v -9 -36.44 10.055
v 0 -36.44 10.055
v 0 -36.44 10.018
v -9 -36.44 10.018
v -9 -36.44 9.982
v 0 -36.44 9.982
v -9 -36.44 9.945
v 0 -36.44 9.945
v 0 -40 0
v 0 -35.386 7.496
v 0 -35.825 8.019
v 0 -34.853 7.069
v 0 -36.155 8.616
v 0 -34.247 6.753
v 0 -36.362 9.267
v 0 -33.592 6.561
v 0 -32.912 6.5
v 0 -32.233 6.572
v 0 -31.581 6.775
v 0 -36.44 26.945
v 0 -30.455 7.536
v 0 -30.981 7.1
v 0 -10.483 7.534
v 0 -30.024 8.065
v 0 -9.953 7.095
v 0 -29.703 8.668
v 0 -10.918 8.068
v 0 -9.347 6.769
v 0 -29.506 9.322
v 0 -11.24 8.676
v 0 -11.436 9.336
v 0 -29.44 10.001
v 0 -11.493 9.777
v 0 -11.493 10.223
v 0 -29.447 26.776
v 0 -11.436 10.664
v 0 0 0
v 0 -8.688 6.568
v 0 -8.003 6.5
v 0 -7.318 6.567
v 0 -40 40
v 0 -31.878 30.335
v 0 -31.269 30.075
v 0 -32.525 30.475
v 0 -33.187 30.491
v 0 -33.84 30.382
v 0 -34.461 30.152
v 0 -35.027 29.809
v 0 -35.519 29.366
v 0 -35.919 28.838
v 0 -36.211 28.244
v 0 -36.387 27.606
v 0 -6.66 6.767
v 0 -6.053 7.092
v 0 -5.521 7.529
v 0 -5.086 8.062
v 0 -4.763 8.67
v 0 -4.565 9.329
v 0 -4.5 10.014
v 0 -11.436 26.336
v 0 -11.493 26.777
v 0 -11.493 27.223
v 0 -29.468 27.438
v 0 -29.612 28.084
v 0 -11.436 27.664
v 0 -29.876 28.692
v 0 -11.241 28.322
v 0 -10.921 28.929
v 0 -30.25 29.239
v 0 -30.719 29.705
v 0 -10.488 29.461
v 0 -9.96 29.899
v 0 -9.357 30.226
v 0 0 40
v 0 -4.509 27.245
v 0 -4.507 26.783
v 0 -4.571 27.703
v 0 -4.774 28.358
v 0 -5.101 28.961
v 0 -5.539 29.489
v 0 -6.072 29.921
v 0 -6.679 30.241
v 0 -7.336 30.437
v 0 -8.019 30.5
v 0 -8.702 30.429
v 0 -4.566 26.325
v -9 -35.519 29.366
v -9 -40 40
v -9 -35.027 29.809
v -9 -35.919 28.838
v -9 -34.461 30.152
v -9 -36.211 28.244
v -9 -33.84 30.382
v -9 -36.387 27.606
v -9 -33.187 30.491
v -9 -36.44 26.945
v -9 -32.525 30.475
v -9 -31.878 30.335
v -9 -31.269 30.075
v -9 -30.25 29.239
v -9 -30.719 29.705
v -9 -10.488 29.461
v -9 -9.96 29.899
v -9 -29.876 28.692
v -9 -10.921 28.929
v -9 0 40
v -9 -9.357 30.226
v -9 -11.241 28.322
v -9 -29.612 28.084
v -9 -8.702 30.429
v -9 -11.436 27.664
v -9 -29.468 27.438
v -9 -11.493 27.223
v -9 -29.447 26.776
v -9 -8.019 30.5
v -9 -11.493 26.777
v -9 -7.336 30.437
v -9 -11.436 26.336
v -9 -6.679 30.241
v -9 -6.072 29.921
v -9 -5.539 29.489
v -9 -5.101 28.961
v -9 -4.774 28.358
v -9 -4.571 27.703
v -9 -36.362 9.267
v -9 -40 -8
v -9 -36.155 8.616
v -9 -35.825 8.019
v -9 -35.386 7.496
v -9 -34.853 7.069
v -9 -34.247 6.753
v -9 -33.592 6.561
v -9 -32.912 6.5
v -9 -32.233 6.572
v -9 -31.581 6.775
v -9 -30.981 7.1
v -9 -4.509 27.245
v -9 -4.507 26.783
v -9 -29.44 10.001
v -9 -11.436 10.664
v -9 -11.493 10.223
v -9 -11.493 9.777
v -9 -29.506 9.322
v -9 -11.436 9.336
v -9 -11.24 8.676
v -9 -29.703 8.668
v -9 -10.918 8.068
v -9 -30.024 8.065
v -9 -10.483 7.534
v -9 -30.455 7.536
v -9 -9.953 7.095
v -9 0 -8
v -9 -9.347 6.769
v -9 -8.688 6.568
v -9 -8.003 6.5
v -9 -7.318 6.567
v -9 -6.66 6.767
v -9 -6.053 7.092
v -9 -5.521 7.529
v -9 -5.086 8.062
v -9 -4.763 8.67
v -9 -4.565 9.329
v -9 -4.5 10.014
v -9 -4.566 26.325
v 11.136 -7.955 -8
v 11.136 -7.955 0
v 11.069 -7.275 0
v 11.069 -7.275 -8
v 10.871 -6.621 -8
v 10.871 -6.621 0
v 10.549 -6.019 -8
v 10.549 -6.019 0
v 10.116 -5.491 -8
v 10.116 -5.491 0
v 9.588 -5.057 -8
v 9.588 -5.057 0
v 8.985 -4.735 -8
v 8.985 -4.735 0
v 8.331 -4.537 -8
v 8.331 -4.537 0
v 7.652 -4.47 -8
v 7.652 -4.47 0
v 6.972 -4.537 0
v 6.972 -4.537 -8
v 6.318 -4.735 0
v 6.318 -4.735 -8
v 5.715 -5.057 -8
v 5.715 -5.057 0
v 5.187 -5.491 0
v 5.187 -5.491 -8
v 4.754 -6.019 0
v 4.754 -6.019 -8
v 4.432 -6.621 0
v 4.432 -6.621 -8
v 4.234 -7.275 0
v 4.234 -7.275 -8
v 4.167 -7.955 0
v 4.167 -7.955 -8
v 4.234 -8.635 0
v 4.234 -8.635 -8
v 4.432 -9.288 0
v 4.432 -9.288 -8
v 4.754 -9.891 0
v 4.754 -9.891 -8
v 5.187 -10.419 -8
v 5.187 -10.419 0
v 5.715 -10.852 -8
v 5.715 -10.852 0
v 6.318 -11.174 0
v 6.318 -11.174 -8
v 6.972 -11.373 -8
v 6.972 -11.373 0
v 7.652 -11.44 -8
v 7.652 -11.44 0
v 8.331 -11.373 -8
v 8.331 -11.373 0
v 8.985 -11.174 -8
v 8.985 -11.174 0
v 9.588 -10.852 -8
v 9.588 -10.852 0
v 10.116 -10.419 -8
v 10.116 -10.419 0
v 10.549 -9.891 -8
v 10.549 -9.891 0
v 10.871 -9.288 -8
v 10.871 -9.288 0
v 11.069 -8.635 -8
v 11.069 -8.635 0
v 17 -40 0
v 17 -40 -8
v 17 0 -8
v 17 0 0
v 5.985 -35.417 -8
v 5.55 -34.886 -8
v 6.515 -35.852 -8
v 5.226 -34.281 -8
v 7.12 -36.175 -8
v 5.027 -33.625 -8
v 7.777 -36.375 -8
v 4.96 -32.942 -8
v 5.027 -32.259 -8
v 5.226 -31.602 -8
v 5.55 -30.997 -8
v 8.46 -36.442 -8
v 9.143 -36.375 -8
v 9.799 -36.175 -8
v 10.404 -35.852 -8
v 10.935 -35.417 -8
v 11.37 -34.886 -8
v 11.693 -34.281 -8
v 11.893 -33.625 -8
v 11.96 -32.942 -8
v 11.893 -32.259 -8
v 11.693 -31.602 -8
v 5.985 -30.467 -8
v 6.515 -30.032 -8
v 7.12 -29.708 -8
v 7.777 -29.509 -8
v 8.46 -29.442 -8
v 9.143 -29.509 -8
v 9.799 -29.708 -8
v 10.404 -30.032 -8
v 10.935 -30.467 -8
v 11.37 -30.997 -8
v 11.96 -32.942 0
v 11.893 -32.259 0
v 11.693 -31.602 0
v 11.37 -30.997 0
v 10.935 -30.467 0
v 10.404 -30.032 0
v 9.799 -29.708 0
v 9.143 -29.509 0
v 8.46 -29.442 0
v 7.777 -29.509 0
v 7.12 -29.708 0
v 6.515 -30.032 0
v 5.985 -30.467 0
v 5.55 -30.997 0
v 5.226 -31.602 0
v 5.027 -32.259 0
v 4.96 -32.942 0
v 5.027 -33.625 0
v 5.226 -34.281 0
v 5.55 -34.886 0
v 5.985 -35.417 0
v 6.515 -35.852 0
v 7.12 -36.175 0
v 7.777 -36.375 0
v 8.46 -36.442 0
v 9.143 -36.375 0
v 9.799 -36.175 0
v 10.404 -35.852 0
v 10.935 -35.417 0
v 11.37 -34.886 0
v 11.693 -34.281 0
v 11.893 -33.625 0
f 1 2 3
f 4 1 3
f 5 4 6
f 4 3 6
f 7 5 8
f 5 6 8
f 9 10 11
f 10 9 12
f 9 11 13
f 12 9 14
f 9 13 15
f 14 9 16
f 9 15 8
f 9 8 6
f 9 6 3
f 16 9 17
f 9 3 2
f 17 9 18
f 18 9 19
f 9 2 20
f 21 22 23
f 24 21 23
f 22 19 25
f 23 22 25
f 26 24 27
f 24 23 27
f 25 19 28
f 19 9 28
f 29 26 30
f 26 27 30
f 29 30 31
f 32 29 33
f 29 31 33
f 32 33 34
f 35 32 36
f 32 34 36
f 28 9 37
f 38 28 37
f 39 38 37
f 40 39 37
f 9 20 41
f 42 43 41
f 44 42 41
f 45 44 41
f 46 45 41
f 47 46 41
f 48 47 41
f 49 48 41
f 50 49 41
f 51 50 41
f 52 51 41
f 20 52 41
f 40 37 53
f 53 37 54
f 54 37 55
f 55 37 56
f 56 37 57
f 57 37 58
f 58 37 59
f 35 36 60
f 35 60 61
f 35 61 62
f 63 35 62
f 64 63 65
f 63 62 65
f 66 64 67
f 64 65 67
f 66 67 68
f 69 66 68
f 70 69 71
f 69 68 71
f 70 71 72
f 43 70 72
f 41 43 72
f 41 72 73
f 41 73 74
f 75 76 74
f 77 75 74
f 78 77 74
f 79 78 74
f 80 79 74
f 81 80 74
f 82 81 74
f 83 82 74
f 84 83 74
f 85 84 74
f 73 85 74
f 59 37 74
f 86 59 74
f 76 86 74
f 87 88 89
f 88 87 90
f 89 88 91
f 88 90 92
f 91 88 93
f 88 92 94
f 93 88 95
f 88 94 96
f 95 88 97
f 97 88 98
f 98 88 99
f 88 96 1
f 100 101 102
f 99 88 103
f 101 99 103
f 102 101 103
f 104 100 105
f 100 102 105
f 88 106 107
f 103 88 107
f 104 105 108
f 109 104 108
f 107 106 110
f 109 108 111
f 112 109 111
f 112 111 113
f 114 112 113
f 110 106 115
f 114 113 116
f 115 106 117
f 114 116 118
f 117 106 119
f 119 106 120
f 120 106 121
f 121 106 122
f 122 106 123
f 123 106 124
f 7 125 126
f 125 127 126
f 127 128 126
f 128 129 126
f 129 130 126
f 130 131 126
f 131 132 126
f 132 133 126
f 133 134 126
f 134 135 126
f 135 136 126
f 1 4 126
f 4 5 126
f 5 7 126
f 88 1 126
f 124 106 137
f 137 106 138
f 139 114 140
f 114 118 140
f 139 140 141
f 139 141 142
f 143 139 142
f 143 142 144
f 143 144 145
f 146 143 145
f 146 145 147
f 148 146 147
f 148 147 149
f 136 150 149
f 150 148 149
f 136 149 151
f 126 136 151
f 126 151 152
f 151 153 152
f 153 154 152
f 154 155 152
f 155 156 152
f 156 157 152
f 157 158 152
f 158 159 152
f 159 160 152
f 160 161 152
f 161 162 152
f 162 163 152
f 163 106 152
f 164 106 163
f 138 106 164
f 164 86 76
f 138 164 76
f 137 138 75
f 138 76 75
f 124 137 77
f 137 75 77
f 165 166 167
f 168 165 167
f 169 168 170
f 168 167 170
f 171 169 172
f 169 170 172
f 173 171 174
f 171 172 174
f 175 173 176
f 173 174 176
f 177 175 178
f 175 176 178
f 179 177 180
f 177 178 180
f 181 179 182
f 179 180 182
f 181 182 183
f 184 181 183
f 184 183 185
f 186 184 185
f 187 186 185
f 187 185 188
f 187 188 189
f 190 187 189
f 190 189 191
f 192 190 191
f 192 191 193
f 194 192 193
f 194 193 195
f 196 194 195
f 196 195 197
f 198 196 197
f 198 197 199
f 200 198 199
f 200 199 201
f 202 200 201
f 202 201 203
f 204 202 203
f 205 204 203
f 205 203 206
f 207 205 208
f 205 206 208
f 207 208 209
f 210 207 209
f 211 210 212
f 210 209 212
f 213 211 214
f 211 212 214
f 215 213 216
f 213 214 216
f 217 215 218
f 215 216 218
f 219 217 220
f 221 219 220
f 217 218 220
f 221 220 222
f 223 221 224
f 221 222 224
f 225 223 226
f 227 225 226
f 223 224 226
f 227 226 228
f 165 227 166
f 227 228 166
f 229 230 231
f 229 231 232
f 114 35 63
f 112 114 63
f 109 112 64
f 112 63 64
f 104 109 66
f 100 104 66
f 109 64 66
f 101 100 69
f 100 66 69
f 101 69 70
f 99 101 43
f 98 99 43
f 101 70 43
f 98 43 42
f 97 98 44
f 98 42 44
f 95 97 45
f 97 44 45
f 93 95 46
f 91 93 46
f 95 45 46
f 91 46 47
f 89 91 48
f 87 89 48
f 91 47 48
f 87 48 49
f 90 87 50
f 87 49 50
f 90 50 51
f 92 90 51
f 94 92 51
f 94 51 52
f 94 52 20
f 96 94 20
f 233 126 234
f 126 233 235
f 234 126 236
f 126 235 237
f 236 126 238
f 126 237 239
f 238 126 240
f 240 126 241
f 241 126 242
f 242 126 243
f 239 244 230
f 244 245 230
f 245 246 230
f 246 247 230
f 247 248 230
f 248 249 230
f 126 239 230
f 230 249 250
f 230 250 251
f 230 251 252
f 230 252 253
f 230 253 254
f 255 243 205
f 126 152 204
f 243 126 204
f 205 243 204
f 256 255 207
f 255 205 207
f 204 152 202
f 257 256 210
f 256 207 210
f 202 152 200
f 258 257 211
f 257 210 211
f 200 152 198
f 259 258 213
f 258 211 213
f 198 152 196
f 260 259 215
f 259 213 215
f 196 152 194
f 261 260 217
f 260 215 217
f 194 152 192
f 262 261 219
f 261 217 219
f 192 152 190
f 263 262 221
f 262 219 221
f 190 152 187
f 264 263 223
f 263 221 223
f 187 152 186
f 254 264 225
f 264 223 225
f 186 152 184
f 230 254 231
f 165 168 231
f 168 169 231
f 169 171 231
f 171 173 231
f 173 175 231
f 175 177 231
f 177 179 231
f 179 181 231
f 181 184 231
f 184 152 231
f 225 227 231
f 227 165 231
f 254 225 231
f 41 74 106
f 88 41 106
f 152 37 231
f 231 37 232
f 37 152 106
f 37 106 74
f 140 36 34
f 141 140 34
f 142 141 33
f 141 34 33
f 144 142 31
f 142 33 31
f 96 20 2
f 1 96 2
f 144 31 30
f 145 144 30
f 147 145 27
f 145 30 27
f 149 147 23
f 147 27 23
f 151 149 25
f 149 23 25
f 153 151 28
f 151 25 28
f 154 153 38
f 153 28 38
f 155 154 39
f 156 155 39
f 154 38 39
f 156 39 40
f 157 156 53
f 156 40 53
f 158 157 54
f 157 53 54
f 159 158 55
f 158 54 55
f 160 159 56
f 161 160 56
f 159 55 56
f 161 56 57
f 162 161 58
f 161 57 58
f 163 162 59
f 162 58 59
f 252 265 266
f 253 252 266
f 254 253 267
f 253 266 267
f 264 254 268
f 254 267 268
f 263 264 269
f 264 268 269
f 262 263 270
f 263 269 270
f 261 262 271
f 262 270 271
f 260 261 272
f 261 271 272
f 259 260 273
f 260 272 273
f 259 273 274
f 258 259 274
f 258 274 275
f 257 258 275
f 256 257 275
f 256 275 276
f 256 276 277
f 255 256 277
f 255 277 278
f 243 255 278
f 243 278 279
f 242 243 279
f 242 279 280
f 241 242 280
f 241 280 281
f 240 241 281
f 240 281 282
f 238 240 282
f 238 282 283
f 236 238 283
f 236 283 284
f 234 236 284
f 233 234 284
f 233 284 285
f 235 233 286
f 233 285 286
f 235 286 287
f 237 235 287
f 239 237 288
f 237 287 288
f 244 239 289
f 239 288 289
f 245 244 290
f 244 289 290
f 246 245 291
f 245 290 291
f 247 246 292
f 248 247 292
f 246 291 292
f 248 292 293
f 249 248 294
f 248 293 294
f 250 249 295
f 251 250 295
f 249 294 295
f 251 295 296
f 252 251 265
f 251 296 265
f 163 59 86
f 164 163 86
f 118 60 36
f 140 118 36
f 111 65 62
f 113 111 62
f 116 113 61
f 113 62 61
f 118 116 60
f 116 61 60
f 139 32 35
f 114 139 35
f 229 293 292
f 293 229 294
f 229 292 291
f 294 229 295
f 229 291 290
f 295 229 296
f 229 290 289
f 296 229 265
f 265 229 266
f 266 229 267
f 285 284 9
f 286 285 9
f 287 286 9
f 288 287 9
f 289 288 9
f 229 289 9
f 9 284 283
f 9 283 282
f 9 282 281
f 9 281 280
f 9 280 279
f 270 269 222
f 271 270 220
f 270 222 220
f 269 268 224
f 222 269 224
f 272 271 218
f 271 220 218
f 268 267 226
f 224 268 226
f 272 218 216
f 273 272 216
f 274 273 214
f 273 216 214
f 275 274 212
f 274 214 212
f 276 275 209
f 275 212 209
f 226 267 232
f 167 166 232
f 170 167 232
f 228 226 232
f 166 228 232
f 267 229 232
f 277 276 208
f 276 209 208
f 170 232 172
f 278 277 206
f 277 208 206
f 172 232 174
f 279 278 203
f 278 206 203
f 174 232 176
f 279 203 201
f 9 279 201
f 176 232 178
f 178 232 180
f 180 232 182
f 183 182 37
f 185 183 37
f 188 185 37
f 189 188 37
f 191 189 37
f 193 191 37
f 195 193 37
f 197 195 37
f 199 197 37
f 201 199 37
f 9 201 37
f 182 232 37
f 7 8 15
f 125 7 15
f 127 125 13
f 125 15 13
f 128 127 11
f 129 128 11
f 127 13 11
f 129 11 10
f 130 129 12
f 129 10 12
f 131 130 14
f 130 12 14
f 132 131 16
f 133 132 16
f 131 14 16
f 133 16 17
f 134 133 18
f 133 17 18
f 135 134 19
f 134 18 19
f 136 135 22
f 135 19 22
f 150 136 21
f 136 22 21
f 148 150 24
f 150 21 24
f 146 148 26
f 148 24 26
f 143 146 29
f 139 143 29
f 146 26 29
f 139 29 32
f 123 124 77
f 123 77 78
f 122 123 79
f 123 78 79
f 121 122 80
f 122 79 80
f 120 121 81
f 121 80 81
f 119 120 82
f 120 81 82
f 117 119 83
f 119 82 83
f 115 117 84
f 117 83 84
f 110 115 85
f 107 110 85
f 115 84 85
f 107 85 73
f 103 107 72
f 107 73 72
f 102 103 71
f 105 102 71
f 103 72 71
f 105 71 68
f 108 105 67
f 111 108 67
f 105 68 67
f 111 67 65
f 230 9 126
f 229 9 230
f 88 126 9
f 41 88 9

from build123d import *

# Parameters (mm, degrees)
F1_DEPTH = 40
F2_R     = 3.5
F2_R_2   = 3.48483
F3_DEPTH = 25
F5_DEPTH = 25


with BuildPart() as f1:
    # F0 (on Front) → F1 (new body)
    with BuildSketch(Plane.XZ):
        Polygon((0, 0), (0, 40), (-9, 40), (-9, 0), (-9, -8), (17, -8), (17, 0), align=None)
    extrude(amount=F1_DEPTH)

    # F2 (on face) → F3 (cut)
    with BuildSketch(Plane.XY):
        with Locations((8.459888, -32.94181)):
            Circle(F2_R)
        with Locations((7.651556, -7.954882)):
            Circle(F2_R_2)
    extrude(amount=-F3_DEPTH, mode=Mode.SUBTRACT)

    # F4 (on face) → F5 (cut)
    with BuildSketch(Plane.YZ):
        with BuildLine():
            Line((-29.44, 10.001492), (-29.447151, 26.776387))
            ThreePointArc((-29.447151, 26.776387), (-32.855382, 30.498977), (-36.439575, 26.94549))
            Line((-36.439575, 26.94549), (-36.439575, 10.05451))
            Line((-36.439575, 10.05451), (-36.439575, 9.94549))
            ThreePointArc((-36.439575, 9.94549), (-32.911998, 6.500112), (-29.44, 10.001492))
        make_face()
        with BuildLine():
            Line((-36.439575, 9.94549), (-36.439575, 10.05451))
            ThreePointArc((-36.439575, 10.05451), (-36.44, 10), (-36.439575, 9.94549))
        make_face()
        with BuildLine():
            Line((-11.436366, 9.335628), (-11.436366, 10.664372))
            ThreePointArc((-11.436366, 10.664372), (-11.5, 10), (-11.436366, 9.335628))
        make_face()
        with BuildLine():
            Line((-11.436366, 26.335628), (-11.436366, 10.664372))
            Line((-11.436366, 10.664372), (-11.436366, 9.335628))
            ThreePointArc((-11.436366, 9.335628), (-7.659282, 6.516624), (-4.500028, 10.01409))
            Line((-4.500028, 10.01409), (-4.565691, 26.325079))
            Line((-4.565691, 26.325079), (-4.571236, 27.70255))
            ThreePointArc((-4.571236, 27.70255), (-8.019464, 30.499946), (-11.436366, 27.664372))
            Line((-11.436366, 27.664372), (-11.436366, 26.335628))
        make_face()
        with BuildLine():
            ThreePointArc((-11.436366, 27.664372), (-11.5, 27), (-11.436366, 26.335628))
            Line((-11.436366, 26.335628), (-11.436366, 27.664372))
        make_face()
        with BuildLine():
            Line((-4.571236, 27.70255), (-4.565691, 26.325079))
            ThreePointArc((-4.565691, 26.325079), (-4.500028, 27.01409), (-4.571236, 27.70255))
        make_face()
    extrude(amount=-F5_DEPTH, mode=Mode.SUBTRACT)


solid = f1.part
